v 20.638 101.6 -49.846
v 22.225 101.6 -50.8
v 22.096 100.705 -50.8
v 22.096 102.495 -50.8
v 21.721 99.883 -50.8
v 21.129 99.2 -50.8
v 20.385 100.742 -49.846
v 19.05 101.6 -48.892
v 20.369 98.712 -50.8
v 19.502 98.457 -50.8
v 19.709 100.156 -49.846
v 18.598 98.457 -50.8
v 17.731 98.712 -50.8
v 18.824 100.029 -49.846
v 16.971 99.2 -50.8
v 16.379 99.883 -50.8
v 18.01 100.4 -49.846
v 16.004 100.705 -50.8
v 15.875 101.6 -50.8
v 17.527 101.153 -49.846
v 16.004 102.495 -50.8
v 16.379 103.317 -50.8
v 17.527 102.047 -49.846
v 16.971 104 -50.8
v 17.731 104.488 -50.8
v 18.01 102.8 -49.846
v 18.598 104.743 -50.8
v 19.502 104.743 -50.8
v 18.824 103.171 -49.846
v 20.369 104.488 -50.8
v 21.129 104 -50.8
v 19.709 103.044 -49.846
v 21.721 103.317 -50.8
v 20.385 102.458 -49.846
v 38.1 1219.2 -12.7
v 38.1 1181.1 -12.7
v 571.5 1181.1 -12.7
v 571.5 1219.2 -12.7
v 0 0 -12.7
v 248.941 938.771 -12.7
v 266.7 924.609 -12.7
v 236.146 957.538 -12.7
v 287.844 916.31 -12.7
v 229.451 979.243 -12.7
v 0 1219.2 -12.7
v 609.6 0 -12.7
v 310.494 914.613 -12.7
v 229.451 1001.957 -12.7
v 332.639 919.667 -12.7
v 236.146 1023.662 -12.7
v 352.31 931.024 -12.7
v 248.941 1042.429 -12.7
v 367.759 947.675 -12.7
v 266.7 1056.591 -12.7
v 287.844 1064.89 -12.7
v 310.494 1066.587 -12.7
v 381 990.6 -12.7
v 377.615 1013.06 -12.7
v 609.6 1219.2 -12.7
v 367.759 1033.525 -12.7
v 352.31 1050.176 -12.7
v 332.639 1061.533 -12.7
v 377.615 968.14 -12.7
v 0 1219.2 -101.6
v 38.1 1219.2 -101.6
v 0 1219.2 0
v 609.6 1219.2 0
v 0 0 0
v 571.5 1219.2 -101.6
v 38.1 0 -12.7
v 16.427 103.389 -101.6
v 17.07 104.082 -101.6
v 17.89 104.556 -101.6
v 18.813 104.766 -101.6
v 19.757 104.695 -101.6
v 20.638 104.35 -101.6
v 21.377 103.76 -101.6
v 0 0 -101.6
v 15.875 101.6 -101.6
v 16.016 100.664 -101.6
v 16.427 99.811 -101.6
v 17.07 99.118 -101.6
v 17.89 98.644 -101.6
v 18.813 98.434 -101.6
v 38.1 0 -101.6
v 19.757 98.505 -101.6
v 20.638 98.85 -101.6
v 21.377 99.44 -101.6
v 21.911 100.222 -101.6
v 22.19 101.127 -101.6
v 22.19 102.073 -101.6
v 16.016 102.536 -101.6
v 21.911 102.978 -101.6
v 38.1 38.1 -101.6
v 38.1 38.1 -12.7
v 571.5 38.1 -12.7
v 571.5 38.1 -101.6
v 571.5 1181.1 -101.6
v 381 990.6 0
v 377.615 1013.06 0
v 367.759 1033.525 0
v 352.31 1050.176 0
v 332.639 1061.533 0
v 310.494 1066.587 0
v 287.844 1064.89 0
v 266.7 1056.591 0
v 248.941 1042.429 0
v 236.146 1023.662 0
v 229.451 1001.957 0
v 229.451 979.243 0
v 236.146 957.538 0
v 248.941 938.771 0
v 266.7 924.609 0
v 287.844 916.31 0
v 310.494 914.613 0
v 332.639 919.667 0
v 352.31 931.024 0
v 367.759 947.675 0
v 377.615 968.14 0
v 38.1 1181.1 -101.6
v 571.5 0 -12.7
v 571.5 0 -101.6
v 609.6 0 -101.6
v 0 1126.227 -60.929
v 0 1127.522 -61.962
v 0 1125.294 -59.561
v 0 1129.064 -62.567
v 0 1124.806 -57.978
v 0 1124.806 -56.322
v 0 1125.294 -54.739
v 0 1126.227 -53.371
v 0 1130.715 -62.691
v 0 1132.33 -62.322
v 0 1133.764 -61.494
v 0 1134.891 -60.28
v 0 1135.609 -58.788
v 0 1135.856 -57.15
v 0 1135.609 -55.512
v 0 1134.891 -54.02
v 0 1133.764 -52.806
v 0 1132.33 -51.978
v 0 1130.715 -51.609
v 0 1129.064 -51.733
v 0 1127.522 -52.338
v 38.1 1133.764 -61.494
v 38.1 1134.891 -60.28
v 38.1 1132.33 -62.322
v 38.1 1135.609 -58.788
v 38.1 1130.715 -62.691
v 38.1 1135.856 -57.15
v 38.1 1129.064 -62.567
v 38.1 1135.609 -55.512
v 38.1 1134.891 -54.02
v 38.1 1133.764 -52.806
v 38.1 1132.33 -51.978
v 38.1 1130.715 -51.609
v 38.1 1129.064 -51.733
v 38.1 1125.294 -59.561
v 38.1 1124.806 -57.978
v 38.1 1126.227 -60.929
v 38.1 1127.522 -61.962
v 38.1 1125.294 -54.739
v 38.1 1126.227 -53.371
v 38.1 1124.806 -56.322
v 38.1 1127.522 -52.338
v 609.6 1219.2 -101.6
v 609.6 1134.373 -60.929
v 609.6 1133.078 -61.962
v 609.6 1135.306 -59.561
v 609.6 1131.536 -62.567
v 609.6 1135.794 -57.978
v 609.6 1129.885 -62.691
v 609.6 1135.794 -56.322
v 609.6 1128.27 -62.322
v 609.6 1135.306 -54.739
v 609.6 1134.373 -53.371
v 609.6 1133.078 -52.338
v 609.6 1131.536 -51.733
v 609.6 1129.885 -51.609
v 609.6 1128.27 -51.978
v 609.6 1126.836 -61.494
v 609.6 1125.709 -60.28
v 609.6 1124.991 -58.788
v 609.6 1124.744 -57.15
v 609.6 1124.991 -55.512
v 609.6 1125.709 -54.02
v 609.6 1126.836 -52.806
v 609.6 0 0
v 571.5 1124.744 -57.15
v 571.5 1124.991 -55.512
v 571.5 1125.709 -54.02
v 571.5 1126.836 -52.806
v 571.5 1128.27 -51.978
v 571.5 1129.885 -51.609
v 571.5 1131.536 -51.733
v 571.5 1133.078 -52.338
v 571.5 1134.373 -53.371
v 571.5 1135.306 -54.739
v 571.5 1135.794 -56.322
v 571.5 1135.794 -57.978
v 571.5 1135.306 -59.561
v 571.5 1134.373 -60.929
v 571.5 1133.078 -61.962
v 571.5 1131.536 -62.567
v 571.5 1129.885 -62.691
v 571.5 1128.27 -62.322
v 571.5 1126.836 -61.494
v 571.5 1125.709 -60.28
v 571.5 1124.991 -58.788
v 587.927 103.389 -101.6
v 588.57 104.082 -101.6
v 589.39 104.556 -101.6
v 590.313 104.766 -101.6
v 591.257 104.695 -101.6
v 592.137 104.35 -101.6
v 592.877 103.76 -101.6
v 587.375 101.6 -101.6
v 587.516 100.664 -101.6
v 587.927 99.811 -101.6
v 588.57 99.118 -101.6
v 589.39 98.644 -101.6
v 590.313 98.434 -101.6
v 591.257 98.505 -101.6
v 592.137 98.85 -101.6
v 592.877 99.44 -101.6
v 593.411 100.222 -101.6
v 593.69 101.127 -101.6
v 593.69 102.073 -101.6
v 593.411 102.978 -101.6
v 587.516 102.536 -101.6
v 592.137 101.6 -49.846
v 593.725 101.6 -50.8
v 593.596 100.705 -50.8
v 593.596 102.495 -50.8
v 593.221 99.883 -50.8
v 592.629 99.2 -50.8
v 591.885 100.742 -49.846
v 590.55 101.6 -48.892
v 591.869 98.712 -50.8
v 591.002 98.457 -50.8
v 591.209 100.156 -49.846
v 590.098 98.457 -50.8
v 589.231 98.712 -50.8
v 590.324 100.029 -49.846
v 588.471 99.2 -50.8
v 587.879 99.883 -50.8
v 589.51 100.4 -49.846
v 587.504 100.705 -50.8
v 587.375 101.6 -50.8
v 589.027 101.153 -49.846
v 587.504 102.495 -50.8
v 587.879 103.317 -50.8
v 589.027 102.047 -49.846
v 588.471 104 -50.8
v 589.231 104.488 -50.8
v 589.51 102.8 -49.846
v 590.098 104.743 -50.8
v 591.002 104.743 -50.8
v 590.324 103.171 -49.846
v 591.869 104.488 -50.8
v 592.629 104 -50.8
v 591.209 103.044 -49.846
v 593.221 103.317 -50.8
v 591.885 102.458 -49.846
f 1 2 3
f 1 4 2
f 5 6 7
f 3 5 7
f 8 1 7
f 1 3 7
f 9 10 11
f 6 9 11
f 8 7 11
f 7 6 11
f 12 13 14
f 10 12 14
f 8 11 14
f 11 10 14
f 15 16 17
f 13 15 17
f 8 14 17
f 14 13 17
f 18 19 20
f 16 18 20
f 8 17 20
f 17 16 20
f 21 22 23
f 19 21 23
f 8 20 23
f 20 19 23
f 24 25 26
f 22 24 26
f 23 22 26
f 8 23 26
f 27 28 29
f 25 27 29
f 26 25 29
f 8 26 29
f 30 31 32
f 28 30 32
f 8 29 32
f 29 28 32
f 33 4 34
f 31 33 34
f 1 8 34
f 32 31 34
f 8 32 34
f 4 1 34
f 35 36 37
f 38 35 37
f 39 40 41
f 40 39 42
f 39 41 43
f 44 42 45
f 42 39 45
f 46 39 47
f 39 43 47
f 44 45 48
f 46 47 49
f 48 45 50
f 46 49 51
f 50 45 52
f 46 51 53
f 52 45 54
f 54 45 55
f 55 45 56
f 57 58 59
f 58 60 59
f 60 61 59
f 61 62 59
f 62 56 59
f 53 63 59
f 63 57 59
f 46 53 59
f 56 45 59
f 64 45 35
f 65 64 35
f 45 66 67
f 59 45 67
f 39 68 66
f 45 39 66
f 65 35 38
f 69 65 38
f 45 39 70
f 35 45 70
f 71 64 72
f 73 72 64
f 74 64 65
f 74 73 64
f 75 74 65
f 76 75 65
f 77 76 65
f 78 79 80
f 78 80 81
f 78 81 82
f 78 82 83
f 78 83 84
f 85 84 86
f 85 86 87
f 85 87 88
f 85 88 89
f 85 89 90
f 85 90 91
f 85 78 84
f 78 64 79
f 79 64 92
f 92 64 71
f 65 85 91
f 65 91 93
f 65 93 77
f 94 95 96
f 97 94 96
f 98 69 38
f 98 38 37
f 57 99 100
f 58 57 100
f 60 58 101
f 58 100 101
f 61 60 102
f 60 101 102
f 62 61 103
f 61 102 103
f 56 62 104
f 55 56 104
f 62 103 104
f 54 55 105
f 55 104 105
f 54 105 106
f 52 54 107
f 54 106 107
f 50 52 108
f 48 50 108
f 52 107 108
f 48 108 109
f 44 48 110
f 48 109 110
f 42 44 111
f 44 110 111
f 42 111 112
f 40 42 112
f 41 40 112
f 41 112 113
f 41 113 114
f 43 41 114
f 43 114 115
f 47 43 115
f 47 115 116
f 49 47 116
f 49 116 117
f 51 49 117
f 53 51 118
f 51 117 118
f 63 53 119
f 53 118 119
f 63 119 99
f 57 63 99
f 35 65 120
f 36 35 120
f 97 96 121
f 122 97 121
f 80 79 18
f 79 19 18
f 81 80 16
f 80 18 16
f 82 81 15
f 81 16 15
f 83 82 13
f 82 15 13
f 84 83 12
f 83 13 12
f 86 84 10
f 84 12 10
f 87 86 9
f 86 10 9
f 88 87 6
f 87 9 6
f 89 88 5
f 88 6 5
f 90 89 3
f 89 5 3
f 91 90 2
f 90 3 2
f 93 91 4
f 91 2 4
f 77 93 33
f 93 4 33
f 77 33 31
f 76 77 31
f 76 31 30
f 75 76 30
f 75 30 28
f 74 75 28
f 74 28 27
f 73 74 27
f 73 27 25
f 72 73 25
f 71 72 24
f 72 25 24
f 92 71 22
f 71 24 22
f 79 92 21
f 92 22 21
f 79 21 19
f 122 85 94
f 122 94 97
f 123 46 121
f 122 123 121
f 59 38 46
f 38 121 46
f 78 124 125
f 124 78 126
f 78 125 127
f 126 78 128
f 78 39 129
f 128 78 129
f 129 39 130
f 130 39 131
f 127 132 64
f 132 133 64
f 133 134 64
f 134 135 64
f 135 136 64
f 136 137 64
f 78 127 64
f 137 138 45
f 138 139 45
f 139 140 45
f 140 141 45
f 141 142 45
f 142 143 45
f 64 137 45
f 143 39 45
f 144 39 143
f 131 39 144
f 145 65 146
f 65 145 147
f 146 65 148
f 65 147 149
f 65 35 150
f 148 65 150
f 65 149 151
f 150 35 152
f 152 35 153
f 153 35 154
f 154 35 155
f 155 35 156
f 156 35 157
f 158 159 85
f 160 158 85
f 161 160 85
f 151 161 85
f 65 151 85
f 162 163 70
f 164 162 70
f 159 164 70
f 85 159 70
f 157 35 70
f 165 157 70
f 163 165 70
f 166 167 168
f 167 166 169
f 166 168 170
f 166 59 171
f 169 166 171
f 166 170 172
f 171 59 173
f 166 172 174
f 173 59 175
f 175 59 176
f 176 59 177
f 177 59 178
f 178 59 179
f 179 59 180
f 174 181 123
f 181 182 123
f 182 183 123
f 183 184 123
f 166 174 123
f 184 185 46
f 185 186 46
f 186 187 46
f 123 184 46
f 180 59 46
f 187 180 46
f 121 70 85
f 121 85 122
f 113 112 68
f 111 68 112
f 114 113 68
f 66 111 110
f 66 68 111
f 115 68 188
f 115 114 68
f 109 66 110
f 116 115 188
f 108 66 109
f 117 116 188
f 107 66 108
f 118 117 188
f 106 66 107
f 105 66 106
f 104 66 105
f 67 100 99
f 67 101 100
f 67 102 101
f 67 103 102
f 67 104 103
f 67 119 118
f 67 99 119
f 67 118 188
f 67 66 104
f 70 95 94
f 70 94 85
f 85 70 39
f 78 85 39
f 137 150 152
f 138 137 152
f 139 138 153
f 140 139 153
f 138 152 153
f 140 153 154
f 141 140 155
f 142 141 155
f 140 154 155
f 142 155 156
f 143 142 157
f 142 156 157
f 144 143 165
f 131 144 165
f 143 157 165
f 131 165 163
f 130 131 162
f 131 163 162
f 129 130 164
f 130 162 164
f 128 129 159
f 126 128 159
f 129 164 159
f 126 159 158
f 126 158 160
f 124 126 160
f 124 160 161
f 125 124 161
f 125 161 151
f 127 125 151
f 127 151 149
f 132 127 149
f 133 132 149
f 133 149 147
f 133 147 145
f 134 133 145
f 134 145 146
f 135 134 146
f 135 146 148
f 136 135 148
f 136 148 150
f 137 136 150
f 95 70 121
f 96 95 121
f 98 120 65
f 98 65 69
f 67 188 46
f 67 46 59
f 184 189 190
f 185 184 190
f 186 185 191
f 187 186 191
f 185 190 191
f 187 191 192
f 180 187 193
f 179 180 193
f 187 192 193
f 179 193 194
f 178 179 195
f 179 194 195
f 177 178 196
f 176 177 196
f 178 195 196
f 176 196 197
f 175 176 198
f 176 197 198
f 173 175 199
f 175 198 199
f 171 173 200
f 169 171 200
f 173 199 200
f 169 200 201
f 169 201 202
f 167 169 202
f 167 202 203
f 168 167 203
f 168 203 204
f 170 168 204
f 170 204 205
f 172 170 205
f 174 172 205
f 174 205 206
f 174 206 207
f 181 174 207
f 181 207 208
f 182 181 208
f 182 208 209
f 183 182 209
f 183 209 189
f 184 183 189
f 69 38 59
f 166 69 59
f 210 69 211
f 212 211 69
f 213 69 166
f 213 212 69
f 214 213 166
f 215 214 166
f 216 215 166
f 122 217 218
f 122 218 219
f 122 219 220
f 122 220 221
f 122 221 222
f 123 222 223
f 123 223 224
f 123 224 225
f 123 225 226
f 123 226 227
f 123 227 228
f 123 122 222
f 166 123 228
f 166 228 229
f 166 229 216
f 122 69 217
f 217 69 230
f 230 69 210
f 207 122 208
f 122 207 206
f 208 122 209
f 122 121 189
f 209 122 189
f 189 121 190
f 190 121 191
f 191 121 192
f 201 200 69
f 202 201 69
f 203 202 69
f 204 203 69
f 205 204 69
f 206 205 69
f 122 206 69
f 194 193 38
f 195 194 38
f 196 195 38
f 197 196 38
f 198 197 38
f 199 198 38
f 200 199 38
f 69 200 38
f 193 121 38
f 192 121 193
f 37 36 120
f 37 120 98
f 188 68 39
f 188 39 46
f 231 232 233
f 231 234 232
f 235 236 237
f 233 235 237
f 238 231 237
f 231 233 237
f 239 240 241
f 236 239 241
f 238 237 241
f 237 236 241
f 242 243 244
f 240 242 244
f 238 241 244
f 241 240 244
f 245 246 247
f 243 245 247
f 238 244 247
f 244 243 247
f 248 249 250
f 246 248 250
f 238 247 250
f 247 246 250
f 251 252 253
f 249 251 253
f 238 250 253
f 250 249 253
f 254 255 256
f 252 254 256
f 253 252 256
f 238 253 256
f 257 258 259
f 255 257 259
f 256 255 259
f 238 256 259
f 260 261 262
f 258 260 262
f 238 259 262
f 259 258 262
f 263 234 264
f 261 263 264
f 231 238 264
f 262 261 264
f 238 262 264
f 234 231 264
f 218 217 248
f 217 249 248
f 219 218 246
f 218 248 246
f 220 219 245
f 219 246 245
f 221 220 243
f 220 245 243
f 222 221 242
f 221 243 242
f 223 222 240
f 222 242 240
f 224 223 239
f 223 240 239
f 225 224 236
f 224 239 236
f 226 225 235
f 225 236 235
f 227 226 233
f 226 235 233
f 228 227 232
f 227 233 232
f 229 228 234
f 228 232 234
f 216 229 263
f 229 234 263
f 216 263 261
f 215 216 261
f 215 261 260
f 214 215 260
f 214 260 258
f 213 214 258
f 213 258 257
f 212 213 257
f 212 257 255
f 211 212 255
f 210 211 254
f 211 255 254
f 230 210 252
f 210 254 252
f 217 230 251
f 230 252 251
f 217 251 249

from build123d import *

# Parameters (mm, degrees)
F0_W      = 609.6
F0_H      = 1219.2
F0_R      = 76.2
F1_DEPTH  = 12.7
F3_DEPTH  = 88.9
F2_W      = 533.4
F2_H      = 38.1
F4_DEPTH  = 88.9
F6_D      = 11.1125
F8_D      = 11.1125
F10_D     = 6.35
F10_DEPTH = 50.8
F10_TIP   = 1.9077324654
F12_D     = 6.35
F12_DEPTH = 50.8
F12_TIP   = 1.9077324654


with BuildPart() as f1:
    # F0 (on Top) → F1 (new body)
    with BuildSketch(Plane.XY):
        with Locations((304.8, 609.6)):
            Rectangle(F0_W, F0_H)
        with Locations((304.8, 990.6)):
            Circle(F0_R, mode=Mode.SUBTRACT)
    extrude(amount=-F1_DEPTH)


with BuildPart() as f3:
    # F2 (on face) → F3 (new body)
    with BuildSketch(Plane(origin=(0, 0, -12.7), x_dir=(1, 0, 0), z_dir=(0, 0, -1))):
        Polygon((0, 0), (0, -1219.2), (38.1, -1219.2), (38.1, -1181.1), (38.1, -38.1), (38.1, 0), align=None)
    extrude(amount=F3_DEPTH)

    # F8 (through all)
    with Locations(Plane(origin=(0, 0, 0), x_dir=(0, -1, 0), z_dir=(-1, 0, 0))):
        with Locations((-1130.3, -57.15)):
            Hole(F8_D / 2)

    # F10
    with Locations(Plane(origin=(0, 0, -101.6), x_dir=(1, 0, 0), z_dir=(0, 0, -1))):
        with Locations((19.05, -101.6)):
            Hole(F10_D / 2, depth=F10_DEPTH)
            with Locations((0, 0, -(F10_DEPTH + F10_TIP / 2))):  # 118° drill point
                Cone(0, F10_D / 2, F10_TIP, mode=Mode.SUBTRACT)


with BuildPart() as f3b:
    # F2 (on face) → F3, piece 2 (new body)
    with BuildSketch(Plane(origin=(0, 0, -12.7), x_dir=(1, 0, 0), z_dir=(0, 0, -1))):
        Polygon((571.5, -1181.1), (571.5, -1219.2), (609.6, -1219.2), (609.6, 0), (571.5, 0), (571.5, -38.1), align=None)
    extrude(amount=F3_DEPTH)

    # F6 (through all)
    with Locations(Plane.YZ.offset(609.6)):
        with Locations((1130.3, -57.15)):
            Hole(F6_D / 2)

    # F12
    with Locations(Plane(origin=(0, 0, -101.6), x_dir=(1, 0, 0), z_dir=(0, 0, -1))):
        with Locations((590.55, -101.6)):
            Hole(F12_D / 2, depth=F12_DEPTH)
            with Locations((0, 0, -(F12_DEPTH + F12_TIP / 2))):  # 118° drill point
                Cone(0, F12_D / 2, F12_TIP, mode=Mode.SUBTRACT)


with BuildPart() as f4:
    # F2 (on face) → F4 (new body)
    with BuildSketch(Plane(origin=(0, 0, -12.7), x_dir=(1, 0, 0), z_dir=(0, 0, -1))):
        with Locations((304.8, -19.05)):
            Rectangle(F2_W, F2_H)
    extrude(amount=F4_DEPTH)


with BuildPart() as f4b:
    # F2 (on face) → F4, piece 2 (new body)
    with BuildSketch(Plane(origin=(0, 0, -12.7), x_dir=(1, 0, 0), z_dir=(0, 0, -1))):
        with Locations((304.8, -1200.15)):
            Rectangle(F2_W, F2_H)
    extrude(amount=F4_DEPTH)


solid = Compound([f1.part, f3.part, f3b.part, f4.part, f4b.part])
